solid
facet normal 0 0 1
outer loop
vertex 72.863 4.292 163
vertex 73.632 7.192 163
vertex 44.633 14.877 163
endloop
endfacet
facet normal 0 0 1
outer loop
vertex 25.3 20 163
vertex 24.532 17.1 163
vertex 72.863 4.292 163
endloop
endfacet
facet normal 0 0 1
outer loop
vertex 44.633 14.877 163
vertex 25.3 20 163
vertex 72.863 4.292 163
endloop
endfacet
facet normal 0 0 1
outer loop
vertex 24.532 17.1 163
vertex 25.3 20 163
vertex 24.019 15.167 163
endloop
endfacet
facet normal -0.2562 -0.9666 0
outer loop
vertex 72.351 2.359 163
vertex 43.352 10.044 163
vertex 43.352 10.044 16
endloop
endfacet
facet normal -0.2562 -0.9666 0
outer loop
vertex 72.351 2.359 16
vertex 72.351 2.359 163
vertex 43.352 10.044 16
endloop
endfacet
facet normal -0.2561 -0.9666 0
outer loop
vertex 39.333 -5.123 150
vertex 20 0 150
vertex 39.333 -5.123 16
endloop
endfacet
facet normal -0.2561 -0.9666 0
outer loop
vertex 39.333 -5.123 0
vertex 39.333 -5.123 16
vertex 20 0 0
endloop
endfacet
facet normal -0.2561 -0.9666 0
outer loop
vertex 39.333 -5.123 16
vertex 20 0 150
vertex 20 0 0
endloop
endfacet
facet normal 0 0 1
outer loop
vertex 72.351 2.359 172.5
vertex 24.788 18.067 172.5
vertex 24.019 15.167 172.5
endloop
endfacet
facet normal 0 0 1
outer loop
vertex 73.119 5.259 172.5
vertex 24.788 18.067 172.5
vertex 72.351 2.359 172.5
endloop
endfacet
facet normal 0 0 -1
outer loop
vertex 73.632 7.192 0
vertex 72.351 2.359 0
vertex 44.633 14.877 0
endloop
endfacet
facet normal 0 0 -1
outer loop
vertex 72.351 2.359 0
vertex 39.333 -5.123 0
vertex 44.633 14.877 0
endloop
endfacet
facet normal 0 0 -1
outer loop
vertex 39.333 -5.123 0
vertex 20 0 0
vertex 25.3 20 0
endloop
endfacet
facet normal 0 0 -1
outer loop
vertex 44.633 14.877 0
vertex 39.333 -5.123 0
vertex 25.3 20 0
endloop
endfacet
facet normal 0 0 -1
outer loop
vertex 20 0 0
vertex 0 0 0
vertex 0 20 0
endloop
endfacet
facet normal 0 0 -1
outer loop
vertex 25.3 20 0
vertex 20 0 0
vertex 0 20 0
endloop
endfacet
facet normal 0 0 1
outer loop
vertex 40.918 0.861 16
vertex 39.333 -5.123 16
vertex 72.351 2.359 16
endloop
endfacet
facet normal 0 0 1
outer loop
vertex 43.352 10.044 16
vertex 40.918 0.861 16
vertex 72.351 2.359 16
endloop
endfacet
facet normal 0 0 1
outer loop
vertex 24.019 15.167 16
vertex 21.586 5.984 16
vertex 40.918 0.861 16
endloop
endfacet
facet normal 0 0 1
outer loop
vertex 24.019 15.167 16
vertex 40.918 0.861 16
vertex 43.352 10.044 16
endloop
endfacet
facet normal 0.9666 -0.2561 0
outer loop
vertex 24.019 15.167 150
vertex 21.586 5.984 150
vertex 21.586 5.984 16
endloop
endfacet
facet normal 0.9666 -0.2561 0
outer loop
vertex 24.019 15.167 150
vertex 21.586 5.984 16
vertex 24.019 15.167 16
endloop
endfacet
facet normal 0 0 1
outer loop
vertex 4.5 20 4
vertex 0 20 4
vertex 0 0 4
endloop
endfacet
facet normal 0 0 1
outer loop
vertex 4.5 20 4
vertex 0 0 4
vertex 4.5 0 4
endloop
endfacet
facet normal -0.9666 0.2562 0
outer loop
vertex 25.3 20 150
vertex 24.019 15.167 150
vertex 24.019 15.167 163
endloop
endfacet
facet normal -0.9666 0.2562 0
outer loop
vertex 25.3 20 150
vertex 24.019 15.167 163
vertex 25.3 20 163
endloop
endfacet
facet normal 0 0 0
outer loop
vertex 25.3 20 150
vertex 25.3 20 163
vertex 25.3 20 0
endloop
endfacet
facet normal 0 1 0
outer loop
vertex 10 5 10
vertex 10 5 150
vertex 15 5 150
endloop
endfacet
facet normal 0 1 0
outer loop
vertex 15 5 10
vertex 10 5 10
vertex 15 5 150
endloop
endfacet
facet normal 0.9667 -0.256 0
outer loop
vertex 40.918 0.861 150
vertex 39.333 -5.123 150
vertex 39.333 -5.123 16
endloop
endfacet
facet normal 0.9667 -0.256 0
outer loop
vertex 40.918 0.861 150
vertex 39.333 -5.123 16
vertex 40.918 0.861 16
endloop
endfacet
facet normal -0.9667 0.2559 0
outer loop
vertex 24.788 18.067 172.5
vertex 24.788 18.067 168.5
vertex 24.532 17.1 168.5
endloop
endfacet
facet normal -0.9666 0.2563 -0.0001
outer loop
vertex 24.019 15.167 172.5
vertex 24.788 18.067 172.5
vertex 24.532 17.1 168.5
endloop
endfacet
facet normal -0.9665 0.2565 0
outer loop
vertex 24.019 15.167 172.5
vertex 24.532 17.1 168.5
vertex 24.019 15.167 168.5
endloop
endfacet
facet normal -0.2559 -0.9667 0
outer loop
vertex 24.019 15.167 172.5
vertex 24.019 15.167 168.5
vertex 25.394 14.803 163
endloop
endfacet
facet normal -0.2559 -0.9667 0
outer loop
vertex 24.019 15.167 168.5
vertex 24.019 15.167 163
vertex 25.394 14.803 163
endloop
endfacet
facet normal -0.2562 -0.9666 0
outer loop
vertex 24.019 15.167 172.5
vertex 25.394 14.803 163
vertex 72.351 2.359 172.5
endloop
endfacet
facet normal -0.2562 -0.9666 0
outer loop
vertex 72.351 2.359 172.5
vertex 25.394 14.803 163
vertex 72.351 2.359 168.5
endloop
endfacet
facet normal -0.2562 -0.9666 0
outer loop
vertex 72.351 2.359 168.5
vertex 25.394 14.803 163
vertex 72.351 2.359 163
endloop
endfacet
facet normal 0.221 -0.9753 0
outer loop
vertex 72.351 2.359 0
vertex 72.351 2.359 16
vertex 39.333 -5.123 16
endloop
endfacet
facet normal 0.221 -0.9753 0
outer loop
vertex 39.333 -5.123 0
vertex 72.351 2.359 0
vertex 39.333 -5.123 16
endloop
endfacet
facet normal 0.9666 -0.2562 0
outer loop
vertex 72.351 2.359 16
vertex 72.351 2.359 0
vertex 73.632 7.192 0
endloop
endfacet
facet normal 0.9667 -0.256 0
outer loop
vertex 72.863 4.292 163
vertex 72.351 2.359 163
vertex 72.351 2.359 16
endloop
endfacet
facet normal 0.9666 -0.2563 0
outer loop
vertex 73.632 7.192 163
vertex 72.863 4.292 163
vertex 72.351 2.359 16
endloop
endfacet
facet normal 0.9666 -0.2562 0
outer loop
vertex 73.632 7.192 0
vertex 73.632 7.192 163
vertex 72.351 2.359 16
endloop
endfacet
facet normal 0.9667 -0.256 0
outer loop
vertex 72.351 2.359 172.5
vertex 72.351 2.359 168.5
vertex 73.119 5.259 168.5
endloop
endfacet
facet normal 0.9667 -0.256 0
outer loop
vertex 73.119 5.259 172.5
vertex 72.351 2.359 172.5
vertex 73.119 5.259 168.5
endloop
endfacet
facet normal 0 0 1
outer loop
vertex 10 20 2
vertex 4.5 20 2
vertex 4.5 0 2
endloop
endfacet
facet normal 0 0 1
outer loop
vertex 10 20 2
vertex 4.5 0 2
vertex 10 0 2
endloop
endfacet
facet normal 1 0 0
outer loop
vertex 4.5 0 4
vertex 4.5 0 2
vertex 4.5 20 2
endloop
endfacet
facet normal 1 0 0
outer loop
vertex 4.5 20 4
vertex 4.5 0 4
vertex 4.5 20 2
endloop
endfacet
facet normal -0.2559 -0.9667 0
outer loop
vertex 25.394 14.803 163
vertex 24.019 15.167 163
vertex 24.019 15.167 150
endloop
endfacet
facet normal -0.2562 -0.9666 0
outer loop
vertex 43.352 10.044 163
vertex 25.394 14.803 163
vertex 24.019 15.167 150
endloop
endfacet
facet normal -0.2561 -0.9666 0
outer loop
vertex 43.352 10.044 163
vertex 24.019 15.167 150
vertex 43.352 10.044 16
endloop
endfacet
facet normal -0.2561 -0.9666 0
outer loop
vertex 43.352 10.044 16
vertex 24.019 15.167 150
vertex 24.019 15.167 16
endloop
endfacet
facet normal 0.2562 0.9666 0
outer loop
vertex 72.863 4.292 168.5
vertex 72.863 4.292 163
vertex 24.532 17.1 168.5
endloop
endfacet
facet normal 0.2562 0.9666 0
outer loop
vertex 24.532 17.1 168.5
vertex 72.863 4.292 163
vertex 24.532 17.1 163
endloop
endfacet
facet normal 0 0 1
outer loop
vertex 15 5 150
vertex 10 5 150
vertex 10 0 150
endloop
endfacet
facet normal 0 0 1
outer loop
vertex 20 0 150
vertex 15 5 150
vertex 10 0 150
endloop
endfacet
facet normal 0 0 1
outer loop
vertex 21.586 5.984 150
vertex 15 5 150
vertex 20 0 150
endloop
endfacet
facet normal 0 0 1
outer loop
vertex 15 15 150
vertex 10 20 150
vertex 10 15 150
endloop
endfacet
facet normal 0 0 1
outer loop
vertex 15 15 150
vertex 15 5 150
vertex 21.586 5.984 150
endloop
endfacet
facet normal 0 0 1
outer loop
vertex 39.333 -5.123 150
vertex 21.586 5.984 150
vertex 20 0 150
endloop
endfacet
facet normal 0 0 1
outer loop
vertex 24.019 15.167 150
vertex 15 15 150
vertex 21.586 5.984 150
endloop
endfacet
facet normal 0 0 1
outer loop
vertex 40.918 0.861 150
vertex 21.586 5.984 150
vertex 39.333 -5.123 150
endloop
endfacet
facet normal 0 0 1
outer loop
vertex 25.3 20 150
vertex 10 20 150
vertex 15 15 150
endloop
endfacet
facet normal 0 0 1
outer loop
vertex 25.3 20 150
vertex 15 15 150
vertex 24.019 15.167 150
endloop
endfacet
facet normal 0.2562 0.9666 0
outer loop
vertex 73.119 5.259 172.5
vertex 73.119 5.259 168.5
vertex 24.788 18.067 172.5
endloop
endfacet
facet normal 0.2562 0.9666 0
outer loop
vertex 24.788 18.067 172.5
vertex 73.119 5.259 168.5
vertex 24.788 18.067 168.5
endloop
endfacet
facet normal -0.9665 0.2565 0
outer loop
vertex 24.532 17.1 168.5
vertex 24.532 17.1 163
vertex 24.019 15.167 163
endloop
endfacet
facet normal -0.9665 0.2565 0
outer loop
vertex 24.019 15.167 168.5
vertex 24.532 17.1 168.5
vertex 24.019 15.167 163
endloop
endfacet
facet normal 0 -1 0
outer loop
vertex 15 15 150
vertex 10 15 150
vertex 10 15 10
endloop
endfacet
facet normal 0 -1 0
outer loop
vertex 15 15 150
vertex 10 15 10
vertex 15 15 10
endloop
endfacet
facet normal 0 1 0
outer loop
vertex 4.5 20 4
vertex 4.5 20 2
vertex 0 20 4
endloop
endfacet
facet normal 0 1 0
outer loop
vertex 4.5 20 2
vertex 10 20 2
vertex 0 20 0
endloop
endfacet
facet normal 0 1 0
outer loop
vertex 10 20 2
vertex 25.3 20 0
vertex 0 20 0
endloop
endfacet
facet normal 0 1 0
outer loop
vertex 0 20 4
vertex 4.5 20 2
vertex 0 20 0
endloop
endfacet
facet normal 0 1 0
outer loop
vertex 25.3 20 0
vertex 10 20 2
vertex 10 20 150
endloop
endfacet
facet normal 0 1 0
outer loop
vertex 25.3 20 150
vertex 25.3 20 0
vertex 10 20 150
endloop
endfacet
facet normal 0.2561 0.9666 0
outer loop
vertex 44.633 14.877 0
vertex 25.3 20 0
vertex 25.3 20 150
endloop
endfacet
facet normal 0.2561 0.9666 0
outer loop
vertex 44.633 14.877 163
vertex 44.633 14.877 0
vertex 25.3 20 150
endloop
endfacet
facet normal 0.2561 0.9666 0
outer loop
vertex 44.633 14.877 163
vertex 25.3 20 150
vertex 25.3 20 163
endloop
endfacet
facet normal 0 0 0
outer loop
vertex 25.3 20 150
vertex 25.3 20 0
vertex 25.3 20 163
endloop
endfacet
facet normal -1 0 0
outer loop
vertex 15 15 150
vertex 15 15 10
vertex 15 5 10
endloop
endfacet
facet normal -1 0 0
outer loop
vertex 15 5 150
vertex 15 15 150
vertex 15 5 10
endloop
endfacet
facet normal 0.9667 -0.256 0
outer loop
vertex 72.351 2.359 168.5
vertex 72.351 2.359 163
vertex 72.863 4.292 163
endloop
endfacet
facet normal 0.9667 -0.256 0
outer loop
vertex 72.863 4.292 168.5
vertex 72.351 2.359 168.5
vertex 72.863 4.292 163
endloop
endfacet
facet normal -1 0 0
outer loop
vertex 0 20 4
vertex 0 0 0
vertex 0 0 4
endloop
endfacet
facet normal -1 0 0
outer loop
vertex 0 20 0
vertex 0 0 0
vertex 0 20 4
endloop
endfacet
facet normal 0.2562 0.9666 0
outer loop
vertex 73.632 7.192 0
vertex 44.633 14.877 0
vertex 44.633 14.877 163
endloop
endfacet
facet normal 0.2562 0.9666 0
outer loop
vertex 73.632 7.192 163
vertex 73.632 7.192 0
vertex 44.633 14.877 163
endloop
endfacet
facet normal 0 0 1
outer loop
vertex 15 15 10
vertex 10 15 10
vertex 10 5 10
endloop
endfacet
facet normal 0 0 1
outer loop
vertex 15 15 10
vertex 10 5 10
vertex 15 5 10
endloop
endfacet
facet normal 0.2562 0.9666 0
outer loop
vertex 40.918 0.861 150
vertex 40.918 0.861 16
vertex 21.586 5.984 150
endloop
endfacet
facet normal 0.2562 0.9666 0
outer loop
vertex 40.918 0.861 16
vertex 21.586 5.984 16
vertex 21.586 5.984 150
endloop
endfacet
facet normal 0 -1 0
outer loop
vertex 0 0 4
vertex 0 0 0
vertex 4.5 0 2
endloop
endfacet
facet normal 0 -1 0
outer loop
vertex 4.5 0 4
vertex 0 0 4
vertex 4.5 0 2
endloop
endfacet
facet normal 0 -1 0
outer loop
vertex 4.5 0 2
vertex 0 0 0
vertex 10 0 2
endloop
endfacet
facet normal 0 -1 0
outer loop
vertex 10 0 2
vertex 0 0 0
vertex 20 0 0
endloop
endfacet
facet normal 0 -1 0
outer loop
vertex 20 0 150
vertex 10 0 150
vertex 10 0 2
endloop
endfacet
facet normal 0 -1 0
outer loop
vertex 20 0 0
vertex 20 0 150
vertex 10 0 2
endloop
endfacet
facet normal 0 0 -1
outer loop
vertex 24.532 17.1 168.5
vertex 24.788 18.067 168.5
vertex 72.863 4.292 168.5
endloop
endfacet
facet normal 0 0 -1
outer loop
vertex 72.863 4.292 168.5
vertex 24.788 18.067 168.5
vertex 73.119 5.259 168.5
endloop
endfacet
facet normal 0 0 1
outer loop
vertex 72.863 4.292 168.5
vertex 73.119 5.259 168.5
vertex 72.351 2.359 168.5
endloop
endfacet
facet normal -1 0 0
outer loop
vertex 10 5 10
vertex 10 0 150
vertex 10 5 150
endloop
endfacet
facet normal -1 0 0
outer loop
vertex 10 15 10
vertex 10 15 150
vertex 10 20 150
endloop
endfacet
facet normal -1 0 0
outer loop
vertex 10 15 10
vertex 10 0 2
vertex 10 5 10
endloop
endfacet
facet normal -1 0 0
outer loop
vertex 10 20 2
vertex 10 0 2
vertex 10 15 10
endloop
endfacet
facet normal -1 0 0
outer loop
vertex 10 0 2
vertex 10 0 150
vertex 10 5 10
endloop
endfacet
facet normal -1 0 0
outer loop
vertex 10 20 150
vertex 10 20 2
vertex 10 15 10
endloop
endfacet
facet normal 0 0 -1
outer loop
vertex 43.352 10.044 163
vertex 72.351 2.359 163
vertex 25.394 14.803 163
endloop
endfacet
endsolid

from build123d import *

# Parameters (mm, degrees)
F0_W      = 4.5
F0_H      = 20
F1_DEPTH  = 4
F2_W      = 5.5
F2_H      = 20
F3_DEPTH  = 2
F4_W      = 5
F4_H      = 5
F5_DEPTH  = 150
F6_W      = 5
F6_H      = 10
F7_DEPTH  = 10
F8_W      = 9.5
F8_H      = 16
F9_DEPTH  = 20
F10_W     = 15.690336
F10_H     = 16
F11_DEPTH = 30
F13_DEPTH = 16
F15_DEPTH = 5.5
F17_DEPTH = 4


with BuildPart() as f1:
    # F0 (on Top) → F1 (new body)
    with BuildSketch(Plane.XY):
        with Locations((2.25, 10)):
            Rectangle(F0_W, F0_H)
    extrude(amount=F1_DEPTH)

    # F2 (on Top) → F3 (join)
    with BuildSketch(Plane.XY):
        with Locations((7.25, 10)):
            Rectangle(F2_W, F2_H)
    extrude(amount=F3_DEPTH)

    # F4 (on Top) → F5 (join)
    with BuildSketch(Plane.XY):
        with Locations((12.5, 17.5)):
            Rectangle(F4_W, F4_H)
        Polygon((20, 20), (15, 20), (15, 15), (15, 5), (15, 0), (20, 0), align=None)
        Polygon((25.3, 20), (20, 20), (20, 0), align=None)
        with Locations((12.5, 2.5)):
            Rectangle(F4_W, F4_H)
    extrude(amount=F5_DEPTH)

    # F6 (on Top) → F7 (join)
    with BuildSketch(Plane.XY):
        with Locations((12.5, 10)):
            Rectangle(F6_W, F6_H)
    extrude(amount=F7_DEPTH)

    # F8 (on face) → F9 (join)
    with BuildSketch(Plane(origin=(18.687659, -4.95223, 0), x_dir=(0.256158, 0.966635, 0), z_dir=(0.966635, -0.256158, 0))):
        with Locations((16.063501, 8)):
            Rectangle(F8_W, F8_H)
        Polygon((20.813501, 16), (20.813501, 0), (25.813501, 0), (25.813501, 163), (20.813501, 163), align=None)
        Polygon((5.123165, 0), (11.313501, 0), (11.313501, 16), (11.313501, 150), (5.123165, 150), align=None)
    extrude(amount=F9_DEPTH)

    # F10 (on face) → F11 (join)
    with BuildSketch(Plane(origin=(38.020356, -10.075394, 0), x_dir=(0.256158, 0.966635, 0), z_dir=(0.966635, -0.256158, 0))):
        Polygon((25.813501, 0), (25.813501, 163), (20.813501, 163), (20.813501, 16), (20.813501, 0), align=None)
        with Locations((12.968333, 8)):
            Rectangle(F10_W, F10_H)
    extrude(amount=F11_DEPTH)

    # F12 (on face) → F13 (cut)
    with BuildSketch(Plane.XY.offset(16)):
        Polygon((72.350952, 2.358914), (39.332697, -5.123165), (68.331743, -12.807912), align=None)
    extrude(amount=-F13_DEPTH, mode=Mode.SUBTRACT)

    # F14 (on face) → F15 (join)
    with BuildSketch(Plane.XY.offset(163)):
        Polygon((24.531525, 17.100095), (24.019209, 15.166826), (72.350952, 2.358914), (72.863268, 4.292183), align=None)
    extrude(amount=F15_DEPTH)

    # F16 (on face) → F17 (join)
    with BuildSketch(Plane.XY.offset(168.5)):
        Polygon((24.787684, 18.06673), (24.019209, 15.166826), (72.350952, 2.358914), (73.119427, 5.258818), align=None)
    extrude(amount=F17_DEPTH)


solid = f1.part
